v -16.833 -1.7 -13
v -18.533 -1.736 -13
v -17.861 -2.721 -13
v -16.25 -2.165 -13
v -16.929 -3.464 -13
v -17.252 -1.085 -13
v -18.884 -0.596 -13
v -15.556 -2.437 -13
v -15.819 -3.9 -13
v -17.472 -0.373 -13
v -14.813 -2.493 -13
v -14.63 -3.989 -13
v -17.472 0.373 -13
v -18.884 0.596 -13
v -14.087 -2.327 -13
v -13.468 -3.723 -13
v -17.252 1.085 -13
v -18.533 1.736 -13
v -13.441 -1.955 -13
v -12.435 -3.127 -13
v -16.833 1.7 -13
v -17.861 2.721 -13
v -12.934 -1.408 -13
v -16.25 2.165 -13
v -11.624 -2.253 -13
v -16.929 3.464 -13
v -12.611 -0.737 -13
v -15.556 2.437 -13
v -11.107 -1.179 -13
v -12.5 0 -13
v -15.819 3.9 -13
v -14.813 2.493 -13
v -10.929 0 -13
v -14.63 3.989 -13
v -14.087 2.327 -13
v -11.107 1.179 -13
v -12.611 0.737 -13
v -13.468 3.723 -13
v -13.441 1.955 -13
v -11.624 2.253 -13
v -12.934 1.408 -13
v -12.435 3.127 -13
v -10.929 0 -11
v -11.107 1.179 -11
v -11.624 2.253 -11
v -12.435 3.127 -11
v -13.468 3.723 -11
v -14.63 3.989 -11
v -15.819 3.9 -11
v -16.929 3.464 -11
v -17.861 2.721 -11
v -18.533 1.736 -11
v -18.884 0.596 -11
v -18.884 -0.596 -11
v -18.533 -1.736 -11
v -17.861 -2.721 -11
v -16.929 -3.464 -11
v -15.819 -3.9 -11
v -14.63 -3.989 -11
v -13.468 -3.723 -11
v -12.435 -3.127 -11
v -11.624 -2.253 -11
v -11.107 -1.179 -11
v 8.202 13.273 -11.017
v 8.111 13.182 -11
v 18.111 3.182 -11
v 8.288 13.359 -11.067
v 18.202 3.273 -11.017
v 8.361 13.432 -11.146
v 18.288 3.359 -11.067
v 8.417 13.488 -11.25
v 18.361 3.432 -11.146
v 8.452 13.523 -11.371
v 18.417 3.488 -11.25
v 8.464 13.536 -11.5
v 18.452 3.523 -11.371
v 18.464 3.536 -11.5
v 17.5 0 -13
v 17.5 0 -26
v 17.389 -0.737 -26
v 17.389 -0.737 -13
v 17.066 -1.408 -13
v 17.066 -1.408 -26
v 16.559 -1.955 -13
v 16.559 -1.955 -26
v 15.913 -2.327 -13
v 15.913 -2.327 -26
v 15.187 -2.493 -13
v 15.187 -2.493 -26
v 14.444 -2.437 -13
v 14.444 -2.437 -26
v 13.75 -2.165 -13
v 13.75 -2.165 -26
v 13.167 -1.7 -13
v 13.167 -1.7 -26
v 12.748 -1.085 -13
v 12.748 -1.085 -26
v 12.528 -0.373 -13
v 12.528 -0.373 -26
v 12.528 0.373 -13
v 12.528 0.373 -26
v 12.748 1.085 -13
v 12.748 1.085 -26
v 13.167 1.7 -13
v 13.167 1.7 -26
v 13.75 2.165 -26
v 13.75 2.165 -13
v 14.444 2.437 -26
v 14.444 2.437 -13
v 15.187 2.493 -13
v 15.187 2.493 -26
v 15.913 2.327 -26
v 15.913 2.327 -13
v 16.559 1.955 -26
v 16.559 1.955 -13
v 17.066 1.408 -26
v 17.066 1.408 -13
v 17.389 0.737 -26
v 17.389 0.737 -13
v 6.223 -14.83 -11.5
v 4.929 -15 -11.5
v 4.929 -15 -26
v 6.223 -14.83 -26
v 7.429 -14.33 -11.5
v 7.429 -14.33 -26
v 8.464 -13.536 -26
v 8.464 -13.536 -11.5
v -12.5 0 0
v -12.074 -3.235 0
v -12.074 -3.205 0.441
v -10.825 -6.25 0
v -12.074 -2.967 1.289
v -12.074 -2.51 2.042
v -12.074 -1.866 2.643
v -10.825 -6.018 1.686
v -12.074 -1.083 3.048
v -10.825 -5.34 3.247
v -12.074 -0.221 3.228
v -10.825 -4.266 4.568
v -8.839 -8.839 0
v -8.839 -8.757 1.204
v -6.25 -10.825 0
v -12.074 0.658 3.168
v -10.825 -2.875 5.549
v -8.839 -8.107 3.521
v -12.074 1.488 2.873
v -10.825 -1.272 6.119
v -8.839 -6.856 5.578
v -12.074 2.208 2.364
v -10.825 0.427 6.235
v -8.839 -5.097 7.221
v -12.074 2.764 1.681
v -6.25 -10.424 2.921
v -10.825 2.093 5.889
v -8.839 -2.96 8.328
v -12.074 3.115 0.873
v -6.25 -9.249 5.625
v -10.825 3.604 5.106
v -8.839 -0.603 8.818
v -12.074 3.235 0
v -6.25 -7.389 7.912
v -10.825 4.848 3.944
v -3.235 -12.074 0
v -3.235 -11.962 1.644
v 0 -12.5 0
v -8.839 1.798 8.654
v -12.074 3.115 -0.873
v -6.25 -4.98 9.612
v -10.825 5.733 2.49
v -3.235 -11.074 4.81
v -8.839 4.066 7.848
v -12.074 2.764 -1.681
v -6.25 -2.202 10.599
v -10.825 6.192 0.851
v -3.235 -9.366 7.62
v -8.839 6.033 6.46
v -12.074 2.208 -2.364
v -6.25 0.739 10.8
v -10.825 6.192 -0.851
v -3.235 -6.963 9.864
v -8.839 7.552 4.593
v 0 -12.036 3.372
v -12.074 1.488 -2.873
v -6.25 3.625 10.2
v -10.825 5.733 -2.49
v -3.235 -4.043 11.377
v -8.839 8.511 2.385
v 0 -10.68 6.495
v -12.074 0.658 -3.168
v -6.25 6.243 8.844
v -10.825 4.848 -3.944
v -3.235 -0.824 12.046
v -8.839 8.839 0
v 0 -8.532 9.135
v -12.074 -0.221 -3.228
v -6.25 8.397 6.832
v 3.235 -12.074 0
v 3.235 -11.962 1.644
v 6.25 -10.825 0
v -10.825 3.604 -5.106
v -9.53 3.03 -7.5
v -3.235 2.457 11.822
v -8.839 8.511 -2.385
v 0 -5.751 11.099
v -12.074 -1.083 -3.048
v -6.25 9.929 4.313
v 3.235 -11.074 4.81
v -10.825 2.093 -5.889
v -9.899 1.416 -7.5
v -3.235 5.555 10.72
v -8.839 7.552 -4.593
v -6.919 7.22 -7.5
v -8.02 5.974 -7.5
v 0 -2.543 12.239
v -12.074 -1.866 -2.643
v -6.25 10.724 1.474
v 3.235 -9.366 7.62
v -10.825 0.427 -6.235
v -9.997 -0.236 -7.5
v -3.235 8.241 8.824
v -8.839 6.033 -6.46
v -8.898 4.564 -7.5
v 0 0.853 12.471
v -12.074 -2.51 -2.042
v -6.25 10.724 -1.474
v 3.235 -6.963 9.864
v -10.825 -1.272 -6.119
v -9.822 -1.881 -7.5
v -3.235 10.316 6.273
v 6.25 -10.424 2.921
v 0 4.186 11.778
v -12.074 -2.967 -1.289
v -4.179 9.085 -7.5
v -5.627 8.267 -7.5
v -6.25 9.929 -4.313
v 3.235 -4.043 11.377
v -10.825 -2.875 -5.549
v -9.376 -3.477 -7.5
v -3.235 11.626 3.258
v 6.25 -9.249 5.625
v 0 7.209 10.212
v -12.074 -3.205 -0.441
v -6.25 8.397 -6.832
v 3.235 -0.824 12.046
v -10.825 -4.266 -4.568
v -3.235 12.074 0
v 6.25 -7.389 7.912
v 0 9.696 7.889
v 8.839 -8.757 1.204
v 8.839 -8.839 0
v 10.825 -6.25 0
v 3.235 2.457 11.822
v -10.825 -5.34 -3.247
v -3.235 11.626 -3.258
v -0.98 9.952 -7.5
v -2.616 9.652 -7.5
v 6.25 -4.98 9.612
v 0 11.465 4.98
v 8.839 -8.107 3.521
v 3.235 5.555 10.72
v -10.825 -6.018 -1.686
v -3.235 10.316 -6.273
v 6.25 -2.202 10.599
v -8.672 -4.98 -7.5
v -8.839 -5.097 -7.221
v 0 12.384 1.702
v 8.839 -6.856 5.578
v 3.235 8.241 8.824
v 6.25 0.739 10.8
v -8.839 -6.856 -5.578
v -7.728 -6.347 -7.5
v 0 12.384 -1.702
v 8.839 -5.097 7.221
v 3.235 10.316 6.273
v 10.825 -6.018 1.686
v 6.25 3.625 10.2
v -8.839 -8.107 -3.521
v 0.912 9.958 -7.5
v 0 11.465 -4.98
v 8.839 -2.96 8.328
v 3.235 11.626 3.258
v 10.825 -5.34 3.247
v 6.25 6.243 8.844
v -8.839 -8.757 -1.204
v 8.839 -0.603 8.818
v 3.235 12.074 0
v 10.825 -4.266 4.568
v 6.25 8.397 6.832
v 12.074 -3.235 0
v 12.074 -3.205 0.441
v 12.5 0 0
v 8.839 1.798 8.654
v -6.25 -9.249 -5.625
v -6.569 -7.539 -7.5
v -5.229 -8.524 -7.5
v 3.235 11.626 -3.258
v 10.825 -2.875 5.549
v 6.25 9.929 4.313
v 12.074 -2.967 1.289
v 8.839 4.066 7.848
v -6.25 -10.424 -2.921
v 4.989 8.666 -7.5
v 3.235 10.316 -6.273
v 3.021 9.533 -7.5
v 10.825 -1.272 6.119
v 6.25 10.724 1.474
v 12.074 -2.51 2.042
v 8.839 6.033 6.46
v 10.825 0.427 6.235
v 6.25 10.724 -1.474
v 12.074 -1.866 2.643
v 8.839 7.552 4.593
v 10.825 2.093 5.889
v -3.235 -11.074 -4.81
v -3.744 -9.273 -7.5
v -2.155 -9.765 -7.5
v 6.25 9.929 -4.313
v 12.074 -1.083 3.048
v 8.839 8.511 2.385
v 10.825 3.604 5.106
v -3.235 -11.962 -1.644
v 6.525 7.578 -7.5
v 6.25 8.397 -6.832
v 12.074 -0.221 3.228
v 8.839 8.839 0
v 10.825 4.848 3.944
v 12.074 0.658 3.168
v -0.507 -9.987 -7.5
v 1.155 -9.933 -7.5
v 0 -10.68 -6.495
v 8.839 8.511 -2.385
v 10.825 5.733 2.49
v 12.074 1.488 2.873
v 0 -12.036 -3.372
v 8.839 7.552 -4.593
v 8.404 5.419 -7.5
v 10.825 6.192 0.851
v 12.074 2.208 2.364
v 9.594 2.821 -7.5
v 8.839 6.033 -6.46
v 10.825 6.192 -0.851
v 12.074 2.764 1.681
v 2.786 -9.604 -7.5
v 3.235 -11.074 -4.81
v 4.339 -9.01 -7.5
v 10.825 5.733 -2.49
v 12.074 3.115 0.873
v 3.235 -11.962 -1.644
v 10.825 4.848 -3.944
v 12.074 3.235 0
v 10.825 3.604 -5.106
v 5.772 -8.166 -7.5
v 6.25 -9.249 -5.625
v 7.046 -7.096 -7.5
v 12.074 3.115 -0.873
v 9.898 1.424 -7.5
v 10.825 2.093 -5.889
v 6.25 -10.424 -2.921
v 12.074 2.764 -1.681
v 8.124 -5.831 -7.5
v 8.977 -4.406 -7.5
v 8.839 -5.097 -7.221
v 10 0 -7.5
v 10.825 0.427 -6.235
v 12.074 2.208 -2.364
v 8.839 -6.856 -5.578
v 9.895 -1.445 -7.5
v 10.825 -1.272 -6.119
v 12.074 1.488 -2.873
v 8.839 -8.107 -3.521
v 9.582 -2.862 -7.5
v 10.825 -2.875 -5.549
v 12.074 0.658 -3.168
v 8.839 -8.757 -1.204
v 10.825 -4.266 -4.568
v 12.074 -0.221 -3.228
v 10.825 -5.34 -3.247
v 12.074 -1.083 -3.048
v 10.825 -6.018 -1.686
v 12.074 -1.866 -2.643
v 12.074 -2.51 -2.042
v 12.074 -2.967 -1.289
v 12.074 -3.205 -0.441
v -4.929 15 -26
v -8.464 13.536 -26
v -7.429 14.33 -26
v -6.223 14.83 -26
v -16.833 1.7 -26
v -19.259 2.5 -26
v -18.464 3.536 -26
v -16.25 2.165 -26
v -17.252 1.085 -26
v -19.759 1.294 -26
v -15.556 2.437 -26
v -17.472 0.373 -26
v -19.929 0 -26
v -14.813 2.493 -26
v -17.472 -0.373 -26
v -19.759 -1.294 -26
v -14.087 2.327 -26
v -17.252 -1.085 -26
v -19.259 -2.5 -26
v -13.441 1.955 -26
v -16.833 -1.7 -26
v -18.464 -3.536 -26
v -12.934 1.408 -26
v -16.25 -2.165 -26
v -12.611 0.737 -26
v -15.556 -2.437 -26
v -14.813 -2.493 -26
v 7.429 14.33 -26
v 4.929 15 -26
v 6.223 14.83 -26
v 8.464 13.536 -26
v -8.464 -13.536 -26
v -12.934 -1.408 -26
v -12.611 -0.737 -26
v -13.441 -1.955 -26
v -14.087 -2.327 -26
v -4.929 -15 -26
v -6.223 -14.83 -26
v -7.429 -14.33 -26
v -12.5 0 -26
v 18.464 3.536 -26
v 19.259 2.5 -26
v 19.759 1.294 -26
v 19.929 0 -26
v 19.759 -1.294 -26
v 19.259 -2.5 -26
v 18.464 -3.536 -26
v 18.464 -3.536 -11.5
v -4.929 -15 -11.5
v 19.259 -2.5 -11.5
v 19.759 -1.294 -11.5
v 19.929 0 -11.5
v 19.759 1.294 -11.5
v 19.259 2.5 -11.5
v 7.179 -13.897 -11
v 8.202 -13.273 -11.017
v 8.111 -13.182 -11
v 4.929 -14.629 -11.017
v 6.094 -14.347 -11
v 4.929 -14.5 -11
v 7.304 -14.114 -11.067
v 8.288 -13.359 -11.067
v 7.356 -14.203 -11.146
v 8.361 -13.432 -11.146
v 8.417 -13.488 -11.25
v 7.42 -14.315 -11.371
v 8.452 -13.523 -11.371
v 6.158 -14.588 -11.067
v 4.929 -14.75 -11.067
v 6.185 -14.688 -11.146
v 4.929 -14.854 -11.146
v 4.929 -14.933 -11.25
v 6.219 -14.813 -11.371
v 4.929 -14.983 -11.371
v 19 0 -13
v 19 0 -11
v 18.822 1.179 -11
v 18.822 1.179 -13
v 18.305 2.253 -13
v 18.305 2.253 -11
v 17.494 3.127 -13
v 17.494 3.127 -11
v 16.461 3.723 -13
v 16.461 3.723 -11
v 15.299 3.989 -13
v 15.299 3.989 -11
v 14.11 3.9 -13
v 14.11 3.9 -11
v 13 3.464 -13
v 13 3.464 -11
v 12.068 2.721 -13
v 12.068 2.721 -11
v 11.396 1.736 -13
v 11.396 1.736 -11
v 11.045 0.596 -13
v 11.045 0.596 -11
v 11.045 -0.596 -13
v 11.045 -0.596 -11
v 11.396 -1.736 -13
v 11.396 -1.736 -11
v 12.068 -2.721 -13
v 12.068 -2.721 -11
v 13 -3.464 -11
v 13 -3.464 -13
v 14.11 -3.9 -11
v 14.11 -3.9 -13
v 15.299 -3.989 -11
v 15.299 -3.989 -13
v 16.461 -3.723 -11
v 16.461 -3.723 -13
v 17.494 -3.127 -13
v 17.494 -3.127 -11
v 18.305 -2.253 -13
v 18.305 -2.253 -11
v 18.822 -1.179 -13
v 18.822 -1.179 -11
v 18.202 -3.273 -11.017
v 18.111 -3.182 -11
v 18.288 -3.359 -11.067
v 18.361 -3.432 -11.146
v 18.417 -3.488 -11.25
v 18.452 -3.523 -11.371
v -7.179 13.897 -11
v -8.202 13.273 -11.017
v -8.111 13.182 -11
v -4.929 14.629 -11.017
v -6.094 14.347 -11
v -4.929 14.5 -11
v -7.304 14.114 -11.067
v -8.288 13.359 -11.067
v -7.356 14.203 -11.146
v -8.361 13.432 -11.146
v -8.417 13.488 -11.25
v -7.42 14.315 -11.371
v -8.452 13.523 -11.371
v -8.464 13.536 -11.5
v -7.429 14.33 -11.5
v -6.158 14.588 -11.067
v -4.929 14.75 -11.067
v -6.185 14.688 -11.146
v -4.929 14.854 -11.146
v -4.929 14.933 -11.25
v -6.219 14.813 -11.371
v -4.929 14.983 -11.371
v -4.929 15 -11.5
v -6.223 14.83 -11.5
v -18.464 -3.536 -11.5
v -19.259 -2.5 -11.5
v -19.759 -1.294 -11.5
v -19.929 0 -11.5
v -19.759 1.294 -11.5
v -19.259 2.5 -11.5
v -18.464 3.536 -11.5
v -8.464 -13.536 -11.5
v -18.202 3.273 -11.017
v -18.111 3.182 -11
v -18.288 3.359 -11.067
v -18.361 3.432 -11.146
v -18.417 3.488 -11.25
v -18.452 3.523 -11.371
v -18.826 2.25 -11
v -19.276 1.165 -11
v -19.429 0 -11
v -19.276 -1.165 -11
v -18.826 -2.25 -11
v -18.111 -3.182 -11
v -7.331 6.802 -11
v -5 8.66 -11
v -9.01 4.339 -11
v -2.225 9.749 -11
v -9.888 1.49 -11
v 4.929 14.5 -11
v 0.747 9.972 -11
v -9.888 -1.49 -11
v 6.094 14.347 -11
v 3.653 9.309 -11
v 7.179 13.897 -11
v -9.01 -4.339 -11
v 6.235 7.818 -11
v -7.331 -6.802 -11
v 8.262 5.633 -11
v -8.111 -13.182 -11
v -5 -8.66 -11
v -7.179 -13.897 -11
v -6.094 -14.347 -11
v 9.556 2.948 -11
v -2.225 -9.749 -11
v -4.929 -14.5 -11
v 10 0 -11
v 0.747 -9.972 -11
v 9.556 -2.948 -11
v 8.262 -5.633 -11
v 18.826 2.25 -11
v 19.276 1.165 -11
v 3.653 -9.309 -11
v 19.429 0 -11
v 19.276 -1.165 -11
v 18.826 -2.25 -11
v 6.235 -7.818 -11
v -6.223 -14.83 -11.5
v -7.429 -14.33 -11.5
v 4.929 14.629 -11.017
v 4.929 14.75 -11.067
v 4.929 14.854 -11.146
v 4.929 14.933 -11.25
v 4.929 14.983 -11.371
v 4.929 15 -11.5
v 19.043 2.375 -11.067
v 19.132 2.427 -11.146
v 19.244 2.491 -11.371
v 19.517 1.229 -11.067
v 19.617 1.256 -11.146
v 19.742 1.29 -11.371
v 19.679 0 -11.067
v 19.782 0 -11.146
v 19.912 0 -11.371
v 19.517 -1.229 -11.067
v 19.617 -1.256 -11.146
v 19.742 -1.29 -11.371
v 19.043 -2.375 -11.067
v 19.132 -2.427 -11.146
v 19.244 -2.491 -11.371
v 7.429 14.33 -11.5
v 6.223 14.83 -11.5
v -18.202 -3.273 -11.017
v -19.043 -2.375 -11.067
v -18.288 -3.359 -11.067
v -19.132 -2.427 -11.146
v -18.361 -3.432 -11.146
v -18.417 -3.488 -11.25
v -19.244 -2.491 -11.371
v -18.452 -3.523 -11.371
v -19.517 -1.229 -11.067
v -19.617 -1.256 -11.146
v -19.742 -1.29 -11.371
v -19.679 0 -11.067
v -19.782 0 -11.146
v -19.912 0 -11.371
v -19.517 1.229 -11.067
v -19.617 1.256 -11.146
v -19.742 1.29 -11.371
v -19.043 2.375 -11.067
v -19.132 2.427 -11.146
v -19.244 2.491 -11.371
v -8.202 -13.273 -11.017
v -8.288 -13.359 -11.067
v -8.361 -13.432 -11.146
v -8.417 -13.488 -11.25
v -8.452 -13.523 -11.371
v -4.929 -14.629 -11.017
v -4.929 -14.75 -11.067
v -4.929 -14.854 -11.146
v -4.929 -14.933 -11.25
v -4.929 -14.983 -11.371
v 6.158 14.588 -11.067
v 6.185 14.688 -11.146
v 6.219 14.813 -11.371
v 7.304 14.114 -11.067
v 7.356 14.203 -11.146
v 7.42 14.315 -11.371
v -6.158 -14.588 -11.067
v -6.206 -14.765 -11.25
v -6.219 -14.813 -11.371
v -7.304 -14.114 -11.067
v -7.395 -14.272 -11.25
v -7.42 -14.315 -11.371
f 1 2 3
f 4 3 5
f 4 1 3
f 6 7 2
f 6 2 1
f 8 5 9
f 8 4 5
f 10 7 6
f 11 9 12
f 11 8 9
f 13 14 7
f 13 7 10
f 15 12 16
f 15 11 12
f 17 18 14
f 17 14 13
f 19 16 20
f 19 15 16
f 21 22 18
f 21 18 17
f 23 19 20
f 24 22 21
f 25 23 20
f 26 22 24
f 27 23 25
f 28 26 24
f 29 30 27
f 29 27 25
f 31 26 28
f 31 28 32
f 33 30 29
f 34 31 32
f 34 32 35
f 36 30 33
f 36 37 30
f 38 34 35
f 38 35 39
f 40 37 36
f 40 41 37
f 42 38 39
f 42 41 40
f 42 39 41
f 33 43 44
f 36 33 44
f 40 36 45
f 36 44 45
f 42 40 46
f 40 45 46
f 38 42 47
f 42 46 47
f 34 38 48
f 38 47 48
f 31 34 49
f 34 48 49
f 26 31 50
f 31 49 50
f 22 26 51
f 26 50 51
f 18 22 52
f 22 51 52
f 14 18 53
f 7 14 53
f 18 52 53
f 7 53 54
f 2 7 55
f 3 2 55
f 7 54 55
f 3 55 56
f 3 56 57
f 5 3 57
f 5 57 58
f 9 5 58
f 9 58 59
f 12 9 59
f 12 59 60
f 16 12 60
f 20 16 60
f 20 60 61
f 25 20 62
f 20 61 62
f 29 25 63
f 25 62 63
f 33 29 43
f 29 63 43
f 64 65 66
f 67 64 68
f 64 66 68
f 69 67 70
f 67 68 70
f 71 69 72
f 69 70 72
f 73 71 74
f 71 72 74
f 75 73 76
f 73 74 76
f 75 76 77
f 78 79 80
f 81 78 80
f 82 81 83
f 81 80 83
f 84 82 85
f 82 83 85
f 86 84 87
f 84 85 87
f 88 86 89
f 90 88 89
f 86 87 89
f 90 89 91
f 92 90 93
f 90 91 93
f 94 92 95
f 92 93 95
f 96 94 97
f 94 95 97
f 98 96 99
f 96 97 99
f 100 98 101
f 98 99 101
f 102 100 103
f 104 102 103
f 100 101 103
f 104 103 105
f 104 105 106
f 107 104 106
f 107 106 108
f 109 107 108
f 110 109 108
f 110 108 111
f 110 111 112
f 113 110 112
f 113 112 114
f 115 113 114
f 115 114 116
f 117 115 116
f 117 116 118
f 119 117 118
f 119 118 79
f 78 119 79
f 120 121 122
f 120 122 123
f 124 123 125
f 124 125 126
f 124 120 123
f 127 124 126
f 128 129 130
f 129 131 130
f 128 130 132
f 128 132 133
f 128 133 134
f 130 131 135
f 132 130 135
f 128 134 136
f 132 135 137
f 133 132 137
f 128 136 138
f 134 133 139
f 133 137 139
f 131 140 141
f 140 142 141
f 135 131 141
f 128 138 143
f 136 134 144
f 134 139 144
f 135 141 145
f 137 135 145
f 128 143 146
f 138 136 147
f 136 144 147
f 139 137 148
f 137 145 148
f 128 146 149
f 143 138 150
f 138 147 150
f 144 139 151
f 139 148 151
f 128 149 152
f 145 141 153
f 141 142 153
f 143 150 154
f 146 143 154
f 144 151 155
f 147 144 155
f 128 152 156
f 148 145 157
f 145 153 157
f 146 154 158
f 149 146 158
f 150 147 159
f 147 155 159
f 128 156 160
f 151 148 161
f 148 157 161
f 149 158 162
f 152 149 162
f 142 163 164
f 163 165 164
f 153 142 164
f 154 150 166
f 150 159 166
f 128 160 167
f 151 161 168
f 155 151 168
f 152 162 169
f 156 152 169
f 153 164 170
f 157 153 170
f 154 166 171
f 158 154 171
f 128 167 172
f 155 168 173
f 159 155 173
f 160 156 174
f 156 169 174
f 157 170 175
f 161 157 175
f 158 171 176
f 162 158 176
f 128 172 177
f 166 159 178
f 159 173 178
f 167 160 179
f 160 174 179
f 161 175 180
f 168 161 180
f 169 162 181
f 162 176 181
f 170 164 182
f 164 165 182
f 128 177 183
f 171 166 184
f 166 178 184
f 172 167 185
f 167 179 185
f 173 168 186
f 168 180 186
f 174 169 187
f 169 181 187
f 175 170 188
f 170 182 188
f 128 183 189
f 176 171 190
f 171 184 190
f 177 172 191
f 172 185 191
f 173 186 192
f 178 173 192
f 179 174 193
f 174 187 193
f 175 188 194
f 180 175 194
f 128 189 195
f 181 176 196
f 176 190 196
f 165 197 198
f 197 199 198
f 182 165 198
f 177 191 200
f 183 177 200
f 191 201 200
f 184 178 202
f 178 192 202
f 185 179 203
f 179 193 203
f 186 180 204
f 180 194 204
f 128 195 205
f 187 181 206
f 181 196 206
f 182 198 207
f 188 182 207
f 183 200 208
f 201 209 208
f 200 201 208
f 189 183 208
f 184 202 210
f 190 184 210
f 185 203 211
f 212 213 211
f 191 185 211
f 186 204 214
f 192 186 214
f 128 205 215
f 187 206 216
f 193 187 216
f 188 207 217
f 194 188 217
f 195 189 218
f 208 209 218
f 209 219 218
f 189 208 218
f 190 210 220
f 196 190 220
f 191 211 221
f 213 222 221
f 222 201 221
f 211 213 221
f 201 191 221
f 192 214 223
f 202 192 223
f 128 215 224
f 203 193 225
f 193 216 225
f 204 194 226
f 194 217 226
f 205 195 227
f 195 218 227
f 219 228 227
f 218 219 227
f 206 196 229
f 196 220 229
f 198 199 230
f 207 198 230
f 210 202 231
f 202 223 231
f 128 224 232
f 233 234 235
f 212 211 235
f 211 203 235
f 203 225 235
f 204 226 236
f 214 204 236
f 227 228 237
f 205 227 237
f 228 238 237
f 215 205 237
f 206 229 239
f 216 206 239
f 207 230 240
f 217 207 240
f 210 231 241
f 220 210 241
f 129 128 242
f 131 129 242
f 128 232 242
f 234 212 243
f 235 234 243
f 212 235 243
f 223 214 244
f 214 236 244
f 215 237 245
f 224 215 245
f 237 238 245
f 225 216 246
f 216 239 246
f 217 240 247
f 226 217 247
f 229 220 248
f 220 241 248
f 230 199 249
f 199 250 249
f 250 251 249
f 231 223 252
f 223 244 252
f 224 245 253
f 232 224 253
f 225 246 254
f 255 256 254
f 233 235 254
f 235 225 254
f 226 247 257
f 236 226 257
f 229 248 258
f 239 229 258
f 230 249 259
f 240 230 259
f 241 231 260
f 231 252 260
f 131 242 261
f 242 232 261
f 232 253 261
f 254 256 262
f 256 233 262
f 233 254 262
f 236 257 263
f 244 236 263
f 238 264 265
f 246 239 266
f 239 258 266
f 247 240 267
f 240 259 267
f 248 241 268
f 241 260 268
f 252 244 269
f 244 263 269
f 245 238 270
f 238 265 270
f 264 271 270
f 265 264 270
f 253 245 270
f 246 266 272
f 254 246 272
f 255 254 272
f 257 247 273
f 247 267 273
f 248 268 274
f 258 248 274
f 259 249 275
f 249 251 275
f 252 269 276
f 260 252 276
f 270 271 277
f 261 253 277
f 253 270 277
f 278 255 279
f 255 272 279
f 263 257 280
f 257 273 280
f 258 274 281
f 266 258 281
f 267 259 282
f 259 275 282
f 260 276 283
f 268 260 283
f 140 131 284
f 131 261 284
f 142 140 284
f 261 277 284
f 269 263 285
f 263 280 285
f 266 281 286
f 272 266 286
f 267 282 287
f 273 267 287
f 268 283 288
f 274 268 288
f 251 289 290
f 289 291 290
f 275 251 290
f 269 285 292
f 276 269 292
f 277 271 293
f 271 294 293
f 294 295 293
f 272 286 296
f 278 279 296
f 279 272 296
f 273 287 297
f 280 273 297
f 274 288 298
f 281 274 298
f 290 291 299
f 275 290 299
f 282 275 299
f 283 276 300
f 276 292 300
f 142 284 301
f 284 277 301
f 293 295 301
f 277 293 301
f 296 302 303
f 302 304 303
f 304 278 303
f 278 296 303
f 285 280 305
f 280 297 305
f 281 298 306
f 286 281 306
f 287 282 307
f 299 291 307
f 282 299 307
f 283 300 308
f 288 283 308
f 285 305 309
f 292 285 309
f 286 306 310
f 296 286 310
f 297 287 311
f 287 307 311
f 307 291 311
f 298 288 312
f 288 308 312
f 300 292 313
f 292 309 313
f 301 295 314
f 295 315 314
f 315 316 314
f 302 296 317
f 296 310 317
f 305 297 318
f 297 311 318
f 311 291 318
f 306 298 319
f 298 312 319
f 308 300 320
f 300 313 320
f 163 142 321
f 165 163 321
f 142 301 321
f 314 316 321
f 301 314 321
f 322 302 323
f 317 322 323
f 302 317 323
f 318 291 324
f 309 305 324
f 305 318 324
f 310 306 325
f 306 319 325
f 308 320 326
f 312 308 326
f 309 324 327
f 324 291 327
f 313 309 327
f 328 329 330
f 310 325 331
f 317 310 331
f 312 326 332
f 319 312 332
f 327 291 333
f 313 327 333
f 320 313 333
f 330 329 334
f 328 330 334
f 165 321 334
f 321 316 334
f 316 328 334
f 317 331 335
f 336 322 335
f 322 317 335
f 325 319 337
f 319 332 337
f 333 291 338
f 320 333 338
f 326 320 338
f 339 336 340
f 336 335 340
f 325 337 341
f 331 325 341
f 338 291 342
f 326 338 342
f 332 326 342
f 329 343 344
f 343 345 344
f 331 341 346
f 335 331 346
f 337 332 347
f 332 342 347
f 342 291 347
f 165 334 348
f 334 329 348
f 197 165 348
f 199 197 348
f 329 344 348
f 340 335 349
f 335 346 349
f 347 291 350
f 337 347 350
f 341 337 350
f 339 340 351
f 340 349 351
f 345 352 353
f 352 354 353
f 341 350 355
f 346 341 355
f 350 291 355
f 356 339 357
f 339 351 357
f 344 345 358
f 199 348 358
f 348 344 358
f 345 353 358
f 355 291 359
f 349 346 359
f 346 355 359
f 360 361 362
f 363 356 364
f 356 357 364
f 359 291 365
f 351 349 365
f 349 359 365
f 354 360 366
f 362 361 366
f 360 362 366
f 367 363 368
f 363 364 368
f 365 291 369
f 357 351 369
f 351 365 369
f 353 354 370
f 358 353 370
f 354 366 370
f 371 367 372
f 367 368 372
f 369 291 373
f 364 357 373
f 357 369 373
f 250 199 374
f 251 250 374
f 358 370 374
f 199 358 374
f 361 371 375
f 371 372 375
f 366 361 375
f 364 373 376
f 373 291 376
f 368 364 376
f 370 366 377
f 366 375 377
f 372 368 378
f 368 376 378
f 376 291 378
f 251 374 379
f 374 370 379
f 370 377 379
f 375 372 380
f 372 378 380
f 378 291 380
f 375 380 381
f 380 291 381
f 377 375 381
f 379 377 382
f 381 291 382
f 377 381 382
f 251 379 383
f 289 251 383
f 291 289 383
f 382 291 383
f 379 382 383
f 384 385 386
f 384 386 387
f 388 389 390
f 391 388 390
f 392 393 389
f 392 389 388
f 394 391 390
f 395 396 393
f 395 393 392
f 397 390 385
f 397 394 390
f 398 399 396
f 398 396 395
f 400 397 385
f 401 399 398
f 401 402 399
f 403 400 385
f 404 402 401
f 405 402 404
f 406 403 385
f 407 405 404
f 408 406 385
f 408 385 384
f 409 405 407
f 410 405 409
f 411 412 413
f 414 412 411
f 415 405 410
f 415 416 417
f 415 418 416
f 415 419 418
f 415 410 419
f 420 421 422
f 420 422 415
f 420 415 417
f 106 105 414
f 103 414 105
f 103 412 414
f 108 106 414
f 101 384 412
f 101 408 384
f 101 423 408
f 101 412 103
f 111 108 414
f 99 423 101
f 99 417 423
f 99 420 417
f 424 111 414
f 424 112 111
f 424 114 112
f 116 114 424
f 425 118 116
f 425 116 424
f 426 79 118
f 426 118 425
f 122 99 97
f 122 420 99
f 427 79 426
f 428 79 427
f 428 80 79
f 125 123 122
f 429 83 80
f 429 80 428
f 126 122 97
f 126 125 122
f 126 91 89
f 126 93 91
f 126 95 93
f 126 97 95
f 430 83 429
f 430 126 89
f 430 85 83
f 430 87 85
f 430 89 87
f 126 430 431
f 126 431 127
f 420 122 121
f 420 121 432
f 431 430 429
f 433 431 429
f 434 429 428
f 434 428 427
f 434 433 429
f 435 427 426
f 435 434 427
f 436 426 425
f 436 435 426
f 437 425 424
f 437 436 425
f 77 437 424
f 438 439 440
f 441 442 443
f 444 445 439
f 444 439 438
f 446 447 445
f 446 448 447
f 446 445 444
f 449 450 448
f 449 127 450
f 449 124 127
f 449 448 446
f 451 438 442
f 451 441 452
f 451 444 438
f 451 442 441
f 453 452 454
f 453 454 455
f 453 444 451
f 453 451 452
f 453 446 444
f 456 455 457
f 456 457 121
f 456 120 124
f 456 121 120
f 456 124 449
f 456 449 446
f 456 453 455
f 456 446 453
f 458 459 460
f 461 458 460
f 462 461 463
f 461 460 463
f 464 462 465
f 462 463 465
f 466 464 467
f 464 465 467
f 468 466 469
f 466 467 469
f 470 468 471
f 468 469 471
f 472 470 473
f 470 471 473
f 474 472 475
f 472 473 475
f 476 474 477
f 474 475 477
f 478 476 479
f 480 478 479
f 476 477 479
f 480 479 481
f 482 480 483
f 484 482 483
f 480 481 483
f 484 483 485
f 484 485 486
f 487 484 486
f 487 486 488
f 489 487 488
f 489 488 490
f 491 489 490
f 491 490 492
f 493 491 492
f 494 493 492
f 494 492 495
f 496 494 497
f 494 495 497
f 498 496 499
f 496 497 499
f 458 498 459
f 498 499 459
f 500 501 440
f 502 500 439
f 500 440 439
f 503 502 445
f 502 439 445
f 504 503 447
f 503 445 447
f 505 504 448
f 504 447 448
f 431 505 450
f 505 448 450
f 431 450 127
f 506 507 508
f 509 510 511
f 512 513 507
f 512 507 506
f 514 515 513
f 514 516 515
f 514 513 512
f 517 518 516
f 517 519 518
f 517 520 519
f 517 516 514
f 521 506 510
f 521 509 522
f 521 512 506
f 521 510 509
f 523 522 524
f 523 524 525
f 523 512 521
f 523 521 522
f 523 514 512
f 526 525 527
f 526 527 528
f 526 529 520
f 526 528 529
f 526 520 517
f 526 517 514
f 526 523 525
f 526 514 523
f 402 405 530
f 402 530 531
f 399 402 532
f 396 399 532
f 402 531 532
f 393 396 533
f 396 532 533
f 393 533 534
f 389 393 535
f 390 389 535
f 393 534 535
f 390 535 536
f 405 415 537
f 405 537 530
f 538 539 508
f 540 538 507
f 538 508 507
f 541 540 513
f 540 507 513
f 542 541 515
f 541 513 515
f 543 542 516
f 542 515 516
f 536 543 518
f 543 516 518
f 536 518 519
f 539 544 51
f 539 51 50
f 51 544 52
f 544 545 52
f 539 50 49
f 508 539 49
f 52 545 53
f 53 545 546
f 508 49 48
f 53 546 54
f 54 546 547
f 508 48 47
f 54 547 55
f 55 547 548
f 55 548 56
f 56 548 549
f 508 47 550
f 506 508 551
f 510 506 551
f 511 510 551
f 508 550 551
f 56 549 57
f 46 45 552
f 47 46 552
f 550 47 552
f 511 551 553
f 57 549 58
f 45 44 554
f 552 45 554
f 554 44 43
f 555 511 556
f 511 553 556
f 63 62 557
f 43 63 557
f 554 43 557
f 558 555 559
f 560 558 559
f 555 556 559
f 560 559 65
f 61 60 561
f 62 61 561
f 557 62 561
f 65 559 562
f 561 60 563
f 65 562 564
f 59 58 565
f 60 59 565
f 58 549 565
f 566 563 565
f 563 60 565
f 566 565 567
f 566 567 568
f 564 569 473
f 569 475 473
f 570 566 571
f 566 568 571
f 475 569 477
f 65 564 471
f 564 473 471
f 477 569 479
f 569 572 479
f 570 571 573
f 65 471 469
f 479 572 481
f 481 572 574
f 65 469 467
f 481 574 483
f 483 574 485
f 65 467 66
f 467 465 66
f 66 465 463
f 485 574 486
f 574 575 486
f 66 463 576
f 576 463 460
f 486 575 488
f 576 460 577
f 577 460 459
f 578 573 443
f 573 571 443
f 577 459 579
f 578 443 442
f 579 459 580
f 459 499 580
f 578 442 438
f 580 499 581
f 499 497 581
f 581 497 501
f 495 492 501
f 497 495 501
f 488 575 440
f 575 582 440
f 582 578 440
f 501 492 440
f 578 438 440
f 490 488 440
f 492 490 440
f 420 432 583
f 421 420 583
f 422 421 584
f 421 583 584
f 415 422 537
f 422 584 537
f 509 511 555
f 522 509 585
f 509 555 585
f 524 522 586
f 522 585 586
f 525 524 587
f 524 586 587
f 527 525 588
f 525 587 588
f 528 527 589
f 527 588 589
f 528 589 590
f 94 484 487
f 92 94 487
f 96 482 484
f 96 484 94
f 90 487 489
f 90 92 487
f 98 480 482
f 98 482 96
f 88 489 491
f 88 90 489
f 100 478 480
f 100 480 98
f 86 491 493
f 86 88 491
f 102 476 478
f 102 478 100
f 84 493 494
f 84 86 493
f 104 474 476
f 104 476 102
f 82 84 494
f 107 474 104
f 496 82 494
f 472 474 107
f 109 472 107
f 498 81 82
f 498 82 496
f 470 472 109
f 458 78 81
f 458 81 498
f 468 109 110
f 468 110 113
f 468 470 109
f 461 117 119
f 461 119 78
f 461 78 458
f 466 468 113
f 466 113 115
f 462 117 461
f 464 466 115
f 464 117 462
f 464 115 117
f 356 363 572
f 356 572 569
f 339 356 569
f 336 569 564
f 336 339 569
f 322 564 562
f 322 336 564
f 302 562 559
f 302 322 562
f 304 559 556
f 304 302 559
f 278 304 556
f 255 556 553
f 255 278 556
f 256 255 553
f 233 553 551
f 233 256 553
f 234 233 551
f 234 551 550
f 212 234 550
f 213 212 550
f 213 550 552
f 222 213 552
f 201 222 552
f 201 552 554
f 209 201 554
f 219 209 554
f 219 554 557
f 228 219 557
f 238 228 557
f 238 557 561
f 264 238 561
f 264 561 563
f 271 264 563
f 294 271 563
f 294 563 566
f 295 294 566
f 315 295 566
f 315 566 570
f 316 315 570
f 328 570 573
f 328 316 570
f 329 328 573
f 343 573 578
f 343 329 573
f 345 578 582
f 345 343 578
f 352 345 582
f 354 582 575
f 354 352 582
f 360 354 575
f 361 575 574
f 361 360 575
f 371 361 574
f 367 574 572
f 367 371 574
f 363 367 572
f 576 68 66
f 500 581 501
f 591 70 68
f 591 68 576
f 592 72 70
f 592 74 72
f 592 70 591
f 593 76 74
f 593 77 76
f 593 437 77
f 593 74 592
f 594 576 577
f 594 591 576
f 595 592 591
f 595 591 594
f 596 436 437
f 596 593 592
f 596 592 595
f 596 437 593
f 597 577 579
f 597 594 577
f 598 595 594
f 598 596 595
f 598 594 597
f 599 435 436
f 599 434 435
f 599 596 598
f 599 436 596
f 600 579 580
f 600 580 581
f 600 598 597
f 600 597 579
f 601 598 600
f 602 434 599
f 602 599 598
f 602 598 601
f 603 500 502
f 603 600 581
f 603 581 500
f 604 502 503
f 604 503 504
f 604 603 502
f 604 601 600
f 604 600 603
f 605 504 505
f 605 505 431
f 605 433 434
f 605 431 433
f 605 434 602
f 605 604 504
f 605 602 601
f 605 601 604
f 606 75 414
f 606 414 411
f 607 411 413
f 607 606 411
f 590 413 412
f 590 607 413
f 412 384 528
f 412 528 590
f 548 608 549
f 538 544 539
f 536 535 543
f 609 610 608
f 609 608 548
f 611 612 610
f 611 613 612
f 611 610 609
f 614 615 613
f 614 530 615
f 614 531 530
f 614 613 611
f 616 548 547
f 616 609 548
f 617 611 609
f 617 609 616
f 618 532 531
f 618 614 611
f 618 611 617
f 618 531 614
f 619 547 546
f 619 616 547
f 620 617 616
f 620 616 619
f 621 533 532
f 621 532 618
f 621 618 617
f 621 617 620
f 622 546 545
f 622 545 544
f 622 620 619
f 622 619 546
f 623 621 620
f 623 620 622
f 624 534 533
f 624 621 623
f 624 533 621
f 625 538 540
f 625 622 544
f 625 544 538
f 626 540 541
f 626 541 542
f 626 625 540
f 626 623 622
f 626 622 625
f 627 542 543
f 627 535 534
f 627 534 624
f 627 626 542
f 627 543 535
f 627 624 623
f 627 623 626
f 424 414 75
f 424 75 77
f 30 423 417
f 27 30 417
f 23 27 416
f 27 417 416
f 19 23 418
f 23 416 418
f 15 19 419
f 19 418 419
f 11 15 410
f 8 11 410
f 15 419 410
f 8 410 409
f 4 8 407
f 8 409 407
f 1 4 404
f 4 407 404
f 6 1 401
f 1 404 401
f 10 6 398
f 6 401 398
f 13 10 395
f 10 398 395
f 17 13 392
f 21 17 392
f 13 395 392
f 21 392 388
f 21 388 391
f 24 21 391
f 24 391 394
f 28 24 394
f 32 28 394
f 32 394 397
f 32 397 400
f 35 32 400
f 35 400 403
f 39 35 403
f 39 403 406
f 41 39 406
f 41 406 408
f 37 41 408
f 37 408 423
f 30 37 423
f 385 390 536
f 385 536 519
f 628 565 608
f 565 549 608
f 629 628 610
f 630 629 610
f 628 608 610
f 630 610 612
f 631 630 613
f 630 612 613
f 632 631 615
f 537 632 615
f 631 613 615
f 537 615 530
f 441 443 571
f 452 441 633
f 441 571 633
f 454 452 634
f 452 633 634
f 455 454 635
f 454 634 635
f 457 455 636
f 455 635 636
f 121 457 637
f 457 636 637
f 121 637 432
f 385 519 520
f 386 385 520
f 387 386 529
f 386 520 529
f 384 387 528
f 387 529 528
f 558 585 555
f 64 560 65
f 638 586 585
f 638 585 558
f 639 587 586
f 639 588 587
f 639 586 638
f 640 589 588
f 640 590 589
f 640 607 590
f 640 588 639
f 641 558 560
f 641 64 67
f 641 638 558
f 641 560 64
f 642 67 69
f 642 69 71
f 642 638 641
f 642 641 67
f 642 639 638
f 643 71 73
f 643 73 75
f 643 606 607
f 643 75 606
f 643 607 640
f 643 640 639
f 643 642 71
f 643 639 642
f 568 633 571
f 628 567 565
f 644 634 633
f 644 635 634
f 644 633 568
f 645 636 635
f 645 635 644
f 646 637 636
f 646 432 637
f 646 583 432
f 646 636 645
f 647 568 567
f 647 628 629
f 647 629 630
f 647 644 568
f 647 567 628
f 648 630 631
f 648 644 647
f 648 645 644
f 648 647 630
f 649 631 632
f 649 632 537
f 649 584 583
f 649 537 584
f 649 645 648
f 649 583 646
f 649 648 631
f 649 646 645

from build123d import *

# Parameters (mm, degrees)
F2_R     = 10
F3_DEPTH = 26
F4_R     = 2.5
F4_R_2   = 10
F5_DEPTH = 15
F6_R     = 5
F7_R     = 0.5
F8_R     = 4
F9_DEPTH = 2


with BuildPart() as f1:
    # F0 (on Top) → F1 (revolve)
    with BuildSketch(Plane.XY):
        with BuildLine():
            ThreePointArc((-12.5, 0), (0, -12.5), (12.5, 0))
            Line((12.5, 0), (-12.5, 0))
        make_face()
    revolve(axis=Axis((5, 0, 0), (-1, 0, 0)))

    # F2 (on Top) → F3 (join)
    with BuildSketch(Plane.XY):
        Circle(F2_R)
    extrude(amount=-F3_DEPTH)

    # F4 (on face) → F5 (join)
    with BuildSketch(Plane(origin=(0, 0, -26), x_dir=(1, 0, 0), z_dir=(0, 0, -1))):
        Polygon((7, 15), (0, 15), (-7, 15), (-22, 0), (-7, -15), (0, -15), (7, -15), (22, 0), align=None)
        with Locations((-15, 0)):
            Circle(F4_R, mode=Mode.SUBTRACT)
        Circle(F4_R_2, mode=Mode.SUBTRACT)
        with Locations((15, 0)):
            Circle(F4_R, mode=Mode.SUBTRACT)
    extrude(amount=-F5_DEPTH)

    # F6
    f6_edges = [f1.edges().sort_by_distance(p)[0] for p in [
        (-22, 0, -18.5),
        (-7, -15, -18.5),
        (7, -15, -18.5),
        (22, 0, -18.5),
        (7, 15, -18.5),
        (-7, 15, -18.5),
    ]]
    fillet(f6_edges, radius=F6_R)

    # F7
    f7_edges = [f1.edges().sort_by_distance(p)[0] for p in [
        (-13.464466, -8.535534, -11),
    ]]
    fillet(f7_edges, radius=F7_R)

    # F8 (on face) → F9 (cut)
    with BuildSketch(Plane.XY.offset(-11)):
        with Locations((-14.928932, 0)):
            Circle(F8_R)
        with Locations((15, 0)):
            Circle(F8_R)
    extrude(amount=-F9_DEPTH, mode=Mode.SUBTRACT)


solid = f1.part
